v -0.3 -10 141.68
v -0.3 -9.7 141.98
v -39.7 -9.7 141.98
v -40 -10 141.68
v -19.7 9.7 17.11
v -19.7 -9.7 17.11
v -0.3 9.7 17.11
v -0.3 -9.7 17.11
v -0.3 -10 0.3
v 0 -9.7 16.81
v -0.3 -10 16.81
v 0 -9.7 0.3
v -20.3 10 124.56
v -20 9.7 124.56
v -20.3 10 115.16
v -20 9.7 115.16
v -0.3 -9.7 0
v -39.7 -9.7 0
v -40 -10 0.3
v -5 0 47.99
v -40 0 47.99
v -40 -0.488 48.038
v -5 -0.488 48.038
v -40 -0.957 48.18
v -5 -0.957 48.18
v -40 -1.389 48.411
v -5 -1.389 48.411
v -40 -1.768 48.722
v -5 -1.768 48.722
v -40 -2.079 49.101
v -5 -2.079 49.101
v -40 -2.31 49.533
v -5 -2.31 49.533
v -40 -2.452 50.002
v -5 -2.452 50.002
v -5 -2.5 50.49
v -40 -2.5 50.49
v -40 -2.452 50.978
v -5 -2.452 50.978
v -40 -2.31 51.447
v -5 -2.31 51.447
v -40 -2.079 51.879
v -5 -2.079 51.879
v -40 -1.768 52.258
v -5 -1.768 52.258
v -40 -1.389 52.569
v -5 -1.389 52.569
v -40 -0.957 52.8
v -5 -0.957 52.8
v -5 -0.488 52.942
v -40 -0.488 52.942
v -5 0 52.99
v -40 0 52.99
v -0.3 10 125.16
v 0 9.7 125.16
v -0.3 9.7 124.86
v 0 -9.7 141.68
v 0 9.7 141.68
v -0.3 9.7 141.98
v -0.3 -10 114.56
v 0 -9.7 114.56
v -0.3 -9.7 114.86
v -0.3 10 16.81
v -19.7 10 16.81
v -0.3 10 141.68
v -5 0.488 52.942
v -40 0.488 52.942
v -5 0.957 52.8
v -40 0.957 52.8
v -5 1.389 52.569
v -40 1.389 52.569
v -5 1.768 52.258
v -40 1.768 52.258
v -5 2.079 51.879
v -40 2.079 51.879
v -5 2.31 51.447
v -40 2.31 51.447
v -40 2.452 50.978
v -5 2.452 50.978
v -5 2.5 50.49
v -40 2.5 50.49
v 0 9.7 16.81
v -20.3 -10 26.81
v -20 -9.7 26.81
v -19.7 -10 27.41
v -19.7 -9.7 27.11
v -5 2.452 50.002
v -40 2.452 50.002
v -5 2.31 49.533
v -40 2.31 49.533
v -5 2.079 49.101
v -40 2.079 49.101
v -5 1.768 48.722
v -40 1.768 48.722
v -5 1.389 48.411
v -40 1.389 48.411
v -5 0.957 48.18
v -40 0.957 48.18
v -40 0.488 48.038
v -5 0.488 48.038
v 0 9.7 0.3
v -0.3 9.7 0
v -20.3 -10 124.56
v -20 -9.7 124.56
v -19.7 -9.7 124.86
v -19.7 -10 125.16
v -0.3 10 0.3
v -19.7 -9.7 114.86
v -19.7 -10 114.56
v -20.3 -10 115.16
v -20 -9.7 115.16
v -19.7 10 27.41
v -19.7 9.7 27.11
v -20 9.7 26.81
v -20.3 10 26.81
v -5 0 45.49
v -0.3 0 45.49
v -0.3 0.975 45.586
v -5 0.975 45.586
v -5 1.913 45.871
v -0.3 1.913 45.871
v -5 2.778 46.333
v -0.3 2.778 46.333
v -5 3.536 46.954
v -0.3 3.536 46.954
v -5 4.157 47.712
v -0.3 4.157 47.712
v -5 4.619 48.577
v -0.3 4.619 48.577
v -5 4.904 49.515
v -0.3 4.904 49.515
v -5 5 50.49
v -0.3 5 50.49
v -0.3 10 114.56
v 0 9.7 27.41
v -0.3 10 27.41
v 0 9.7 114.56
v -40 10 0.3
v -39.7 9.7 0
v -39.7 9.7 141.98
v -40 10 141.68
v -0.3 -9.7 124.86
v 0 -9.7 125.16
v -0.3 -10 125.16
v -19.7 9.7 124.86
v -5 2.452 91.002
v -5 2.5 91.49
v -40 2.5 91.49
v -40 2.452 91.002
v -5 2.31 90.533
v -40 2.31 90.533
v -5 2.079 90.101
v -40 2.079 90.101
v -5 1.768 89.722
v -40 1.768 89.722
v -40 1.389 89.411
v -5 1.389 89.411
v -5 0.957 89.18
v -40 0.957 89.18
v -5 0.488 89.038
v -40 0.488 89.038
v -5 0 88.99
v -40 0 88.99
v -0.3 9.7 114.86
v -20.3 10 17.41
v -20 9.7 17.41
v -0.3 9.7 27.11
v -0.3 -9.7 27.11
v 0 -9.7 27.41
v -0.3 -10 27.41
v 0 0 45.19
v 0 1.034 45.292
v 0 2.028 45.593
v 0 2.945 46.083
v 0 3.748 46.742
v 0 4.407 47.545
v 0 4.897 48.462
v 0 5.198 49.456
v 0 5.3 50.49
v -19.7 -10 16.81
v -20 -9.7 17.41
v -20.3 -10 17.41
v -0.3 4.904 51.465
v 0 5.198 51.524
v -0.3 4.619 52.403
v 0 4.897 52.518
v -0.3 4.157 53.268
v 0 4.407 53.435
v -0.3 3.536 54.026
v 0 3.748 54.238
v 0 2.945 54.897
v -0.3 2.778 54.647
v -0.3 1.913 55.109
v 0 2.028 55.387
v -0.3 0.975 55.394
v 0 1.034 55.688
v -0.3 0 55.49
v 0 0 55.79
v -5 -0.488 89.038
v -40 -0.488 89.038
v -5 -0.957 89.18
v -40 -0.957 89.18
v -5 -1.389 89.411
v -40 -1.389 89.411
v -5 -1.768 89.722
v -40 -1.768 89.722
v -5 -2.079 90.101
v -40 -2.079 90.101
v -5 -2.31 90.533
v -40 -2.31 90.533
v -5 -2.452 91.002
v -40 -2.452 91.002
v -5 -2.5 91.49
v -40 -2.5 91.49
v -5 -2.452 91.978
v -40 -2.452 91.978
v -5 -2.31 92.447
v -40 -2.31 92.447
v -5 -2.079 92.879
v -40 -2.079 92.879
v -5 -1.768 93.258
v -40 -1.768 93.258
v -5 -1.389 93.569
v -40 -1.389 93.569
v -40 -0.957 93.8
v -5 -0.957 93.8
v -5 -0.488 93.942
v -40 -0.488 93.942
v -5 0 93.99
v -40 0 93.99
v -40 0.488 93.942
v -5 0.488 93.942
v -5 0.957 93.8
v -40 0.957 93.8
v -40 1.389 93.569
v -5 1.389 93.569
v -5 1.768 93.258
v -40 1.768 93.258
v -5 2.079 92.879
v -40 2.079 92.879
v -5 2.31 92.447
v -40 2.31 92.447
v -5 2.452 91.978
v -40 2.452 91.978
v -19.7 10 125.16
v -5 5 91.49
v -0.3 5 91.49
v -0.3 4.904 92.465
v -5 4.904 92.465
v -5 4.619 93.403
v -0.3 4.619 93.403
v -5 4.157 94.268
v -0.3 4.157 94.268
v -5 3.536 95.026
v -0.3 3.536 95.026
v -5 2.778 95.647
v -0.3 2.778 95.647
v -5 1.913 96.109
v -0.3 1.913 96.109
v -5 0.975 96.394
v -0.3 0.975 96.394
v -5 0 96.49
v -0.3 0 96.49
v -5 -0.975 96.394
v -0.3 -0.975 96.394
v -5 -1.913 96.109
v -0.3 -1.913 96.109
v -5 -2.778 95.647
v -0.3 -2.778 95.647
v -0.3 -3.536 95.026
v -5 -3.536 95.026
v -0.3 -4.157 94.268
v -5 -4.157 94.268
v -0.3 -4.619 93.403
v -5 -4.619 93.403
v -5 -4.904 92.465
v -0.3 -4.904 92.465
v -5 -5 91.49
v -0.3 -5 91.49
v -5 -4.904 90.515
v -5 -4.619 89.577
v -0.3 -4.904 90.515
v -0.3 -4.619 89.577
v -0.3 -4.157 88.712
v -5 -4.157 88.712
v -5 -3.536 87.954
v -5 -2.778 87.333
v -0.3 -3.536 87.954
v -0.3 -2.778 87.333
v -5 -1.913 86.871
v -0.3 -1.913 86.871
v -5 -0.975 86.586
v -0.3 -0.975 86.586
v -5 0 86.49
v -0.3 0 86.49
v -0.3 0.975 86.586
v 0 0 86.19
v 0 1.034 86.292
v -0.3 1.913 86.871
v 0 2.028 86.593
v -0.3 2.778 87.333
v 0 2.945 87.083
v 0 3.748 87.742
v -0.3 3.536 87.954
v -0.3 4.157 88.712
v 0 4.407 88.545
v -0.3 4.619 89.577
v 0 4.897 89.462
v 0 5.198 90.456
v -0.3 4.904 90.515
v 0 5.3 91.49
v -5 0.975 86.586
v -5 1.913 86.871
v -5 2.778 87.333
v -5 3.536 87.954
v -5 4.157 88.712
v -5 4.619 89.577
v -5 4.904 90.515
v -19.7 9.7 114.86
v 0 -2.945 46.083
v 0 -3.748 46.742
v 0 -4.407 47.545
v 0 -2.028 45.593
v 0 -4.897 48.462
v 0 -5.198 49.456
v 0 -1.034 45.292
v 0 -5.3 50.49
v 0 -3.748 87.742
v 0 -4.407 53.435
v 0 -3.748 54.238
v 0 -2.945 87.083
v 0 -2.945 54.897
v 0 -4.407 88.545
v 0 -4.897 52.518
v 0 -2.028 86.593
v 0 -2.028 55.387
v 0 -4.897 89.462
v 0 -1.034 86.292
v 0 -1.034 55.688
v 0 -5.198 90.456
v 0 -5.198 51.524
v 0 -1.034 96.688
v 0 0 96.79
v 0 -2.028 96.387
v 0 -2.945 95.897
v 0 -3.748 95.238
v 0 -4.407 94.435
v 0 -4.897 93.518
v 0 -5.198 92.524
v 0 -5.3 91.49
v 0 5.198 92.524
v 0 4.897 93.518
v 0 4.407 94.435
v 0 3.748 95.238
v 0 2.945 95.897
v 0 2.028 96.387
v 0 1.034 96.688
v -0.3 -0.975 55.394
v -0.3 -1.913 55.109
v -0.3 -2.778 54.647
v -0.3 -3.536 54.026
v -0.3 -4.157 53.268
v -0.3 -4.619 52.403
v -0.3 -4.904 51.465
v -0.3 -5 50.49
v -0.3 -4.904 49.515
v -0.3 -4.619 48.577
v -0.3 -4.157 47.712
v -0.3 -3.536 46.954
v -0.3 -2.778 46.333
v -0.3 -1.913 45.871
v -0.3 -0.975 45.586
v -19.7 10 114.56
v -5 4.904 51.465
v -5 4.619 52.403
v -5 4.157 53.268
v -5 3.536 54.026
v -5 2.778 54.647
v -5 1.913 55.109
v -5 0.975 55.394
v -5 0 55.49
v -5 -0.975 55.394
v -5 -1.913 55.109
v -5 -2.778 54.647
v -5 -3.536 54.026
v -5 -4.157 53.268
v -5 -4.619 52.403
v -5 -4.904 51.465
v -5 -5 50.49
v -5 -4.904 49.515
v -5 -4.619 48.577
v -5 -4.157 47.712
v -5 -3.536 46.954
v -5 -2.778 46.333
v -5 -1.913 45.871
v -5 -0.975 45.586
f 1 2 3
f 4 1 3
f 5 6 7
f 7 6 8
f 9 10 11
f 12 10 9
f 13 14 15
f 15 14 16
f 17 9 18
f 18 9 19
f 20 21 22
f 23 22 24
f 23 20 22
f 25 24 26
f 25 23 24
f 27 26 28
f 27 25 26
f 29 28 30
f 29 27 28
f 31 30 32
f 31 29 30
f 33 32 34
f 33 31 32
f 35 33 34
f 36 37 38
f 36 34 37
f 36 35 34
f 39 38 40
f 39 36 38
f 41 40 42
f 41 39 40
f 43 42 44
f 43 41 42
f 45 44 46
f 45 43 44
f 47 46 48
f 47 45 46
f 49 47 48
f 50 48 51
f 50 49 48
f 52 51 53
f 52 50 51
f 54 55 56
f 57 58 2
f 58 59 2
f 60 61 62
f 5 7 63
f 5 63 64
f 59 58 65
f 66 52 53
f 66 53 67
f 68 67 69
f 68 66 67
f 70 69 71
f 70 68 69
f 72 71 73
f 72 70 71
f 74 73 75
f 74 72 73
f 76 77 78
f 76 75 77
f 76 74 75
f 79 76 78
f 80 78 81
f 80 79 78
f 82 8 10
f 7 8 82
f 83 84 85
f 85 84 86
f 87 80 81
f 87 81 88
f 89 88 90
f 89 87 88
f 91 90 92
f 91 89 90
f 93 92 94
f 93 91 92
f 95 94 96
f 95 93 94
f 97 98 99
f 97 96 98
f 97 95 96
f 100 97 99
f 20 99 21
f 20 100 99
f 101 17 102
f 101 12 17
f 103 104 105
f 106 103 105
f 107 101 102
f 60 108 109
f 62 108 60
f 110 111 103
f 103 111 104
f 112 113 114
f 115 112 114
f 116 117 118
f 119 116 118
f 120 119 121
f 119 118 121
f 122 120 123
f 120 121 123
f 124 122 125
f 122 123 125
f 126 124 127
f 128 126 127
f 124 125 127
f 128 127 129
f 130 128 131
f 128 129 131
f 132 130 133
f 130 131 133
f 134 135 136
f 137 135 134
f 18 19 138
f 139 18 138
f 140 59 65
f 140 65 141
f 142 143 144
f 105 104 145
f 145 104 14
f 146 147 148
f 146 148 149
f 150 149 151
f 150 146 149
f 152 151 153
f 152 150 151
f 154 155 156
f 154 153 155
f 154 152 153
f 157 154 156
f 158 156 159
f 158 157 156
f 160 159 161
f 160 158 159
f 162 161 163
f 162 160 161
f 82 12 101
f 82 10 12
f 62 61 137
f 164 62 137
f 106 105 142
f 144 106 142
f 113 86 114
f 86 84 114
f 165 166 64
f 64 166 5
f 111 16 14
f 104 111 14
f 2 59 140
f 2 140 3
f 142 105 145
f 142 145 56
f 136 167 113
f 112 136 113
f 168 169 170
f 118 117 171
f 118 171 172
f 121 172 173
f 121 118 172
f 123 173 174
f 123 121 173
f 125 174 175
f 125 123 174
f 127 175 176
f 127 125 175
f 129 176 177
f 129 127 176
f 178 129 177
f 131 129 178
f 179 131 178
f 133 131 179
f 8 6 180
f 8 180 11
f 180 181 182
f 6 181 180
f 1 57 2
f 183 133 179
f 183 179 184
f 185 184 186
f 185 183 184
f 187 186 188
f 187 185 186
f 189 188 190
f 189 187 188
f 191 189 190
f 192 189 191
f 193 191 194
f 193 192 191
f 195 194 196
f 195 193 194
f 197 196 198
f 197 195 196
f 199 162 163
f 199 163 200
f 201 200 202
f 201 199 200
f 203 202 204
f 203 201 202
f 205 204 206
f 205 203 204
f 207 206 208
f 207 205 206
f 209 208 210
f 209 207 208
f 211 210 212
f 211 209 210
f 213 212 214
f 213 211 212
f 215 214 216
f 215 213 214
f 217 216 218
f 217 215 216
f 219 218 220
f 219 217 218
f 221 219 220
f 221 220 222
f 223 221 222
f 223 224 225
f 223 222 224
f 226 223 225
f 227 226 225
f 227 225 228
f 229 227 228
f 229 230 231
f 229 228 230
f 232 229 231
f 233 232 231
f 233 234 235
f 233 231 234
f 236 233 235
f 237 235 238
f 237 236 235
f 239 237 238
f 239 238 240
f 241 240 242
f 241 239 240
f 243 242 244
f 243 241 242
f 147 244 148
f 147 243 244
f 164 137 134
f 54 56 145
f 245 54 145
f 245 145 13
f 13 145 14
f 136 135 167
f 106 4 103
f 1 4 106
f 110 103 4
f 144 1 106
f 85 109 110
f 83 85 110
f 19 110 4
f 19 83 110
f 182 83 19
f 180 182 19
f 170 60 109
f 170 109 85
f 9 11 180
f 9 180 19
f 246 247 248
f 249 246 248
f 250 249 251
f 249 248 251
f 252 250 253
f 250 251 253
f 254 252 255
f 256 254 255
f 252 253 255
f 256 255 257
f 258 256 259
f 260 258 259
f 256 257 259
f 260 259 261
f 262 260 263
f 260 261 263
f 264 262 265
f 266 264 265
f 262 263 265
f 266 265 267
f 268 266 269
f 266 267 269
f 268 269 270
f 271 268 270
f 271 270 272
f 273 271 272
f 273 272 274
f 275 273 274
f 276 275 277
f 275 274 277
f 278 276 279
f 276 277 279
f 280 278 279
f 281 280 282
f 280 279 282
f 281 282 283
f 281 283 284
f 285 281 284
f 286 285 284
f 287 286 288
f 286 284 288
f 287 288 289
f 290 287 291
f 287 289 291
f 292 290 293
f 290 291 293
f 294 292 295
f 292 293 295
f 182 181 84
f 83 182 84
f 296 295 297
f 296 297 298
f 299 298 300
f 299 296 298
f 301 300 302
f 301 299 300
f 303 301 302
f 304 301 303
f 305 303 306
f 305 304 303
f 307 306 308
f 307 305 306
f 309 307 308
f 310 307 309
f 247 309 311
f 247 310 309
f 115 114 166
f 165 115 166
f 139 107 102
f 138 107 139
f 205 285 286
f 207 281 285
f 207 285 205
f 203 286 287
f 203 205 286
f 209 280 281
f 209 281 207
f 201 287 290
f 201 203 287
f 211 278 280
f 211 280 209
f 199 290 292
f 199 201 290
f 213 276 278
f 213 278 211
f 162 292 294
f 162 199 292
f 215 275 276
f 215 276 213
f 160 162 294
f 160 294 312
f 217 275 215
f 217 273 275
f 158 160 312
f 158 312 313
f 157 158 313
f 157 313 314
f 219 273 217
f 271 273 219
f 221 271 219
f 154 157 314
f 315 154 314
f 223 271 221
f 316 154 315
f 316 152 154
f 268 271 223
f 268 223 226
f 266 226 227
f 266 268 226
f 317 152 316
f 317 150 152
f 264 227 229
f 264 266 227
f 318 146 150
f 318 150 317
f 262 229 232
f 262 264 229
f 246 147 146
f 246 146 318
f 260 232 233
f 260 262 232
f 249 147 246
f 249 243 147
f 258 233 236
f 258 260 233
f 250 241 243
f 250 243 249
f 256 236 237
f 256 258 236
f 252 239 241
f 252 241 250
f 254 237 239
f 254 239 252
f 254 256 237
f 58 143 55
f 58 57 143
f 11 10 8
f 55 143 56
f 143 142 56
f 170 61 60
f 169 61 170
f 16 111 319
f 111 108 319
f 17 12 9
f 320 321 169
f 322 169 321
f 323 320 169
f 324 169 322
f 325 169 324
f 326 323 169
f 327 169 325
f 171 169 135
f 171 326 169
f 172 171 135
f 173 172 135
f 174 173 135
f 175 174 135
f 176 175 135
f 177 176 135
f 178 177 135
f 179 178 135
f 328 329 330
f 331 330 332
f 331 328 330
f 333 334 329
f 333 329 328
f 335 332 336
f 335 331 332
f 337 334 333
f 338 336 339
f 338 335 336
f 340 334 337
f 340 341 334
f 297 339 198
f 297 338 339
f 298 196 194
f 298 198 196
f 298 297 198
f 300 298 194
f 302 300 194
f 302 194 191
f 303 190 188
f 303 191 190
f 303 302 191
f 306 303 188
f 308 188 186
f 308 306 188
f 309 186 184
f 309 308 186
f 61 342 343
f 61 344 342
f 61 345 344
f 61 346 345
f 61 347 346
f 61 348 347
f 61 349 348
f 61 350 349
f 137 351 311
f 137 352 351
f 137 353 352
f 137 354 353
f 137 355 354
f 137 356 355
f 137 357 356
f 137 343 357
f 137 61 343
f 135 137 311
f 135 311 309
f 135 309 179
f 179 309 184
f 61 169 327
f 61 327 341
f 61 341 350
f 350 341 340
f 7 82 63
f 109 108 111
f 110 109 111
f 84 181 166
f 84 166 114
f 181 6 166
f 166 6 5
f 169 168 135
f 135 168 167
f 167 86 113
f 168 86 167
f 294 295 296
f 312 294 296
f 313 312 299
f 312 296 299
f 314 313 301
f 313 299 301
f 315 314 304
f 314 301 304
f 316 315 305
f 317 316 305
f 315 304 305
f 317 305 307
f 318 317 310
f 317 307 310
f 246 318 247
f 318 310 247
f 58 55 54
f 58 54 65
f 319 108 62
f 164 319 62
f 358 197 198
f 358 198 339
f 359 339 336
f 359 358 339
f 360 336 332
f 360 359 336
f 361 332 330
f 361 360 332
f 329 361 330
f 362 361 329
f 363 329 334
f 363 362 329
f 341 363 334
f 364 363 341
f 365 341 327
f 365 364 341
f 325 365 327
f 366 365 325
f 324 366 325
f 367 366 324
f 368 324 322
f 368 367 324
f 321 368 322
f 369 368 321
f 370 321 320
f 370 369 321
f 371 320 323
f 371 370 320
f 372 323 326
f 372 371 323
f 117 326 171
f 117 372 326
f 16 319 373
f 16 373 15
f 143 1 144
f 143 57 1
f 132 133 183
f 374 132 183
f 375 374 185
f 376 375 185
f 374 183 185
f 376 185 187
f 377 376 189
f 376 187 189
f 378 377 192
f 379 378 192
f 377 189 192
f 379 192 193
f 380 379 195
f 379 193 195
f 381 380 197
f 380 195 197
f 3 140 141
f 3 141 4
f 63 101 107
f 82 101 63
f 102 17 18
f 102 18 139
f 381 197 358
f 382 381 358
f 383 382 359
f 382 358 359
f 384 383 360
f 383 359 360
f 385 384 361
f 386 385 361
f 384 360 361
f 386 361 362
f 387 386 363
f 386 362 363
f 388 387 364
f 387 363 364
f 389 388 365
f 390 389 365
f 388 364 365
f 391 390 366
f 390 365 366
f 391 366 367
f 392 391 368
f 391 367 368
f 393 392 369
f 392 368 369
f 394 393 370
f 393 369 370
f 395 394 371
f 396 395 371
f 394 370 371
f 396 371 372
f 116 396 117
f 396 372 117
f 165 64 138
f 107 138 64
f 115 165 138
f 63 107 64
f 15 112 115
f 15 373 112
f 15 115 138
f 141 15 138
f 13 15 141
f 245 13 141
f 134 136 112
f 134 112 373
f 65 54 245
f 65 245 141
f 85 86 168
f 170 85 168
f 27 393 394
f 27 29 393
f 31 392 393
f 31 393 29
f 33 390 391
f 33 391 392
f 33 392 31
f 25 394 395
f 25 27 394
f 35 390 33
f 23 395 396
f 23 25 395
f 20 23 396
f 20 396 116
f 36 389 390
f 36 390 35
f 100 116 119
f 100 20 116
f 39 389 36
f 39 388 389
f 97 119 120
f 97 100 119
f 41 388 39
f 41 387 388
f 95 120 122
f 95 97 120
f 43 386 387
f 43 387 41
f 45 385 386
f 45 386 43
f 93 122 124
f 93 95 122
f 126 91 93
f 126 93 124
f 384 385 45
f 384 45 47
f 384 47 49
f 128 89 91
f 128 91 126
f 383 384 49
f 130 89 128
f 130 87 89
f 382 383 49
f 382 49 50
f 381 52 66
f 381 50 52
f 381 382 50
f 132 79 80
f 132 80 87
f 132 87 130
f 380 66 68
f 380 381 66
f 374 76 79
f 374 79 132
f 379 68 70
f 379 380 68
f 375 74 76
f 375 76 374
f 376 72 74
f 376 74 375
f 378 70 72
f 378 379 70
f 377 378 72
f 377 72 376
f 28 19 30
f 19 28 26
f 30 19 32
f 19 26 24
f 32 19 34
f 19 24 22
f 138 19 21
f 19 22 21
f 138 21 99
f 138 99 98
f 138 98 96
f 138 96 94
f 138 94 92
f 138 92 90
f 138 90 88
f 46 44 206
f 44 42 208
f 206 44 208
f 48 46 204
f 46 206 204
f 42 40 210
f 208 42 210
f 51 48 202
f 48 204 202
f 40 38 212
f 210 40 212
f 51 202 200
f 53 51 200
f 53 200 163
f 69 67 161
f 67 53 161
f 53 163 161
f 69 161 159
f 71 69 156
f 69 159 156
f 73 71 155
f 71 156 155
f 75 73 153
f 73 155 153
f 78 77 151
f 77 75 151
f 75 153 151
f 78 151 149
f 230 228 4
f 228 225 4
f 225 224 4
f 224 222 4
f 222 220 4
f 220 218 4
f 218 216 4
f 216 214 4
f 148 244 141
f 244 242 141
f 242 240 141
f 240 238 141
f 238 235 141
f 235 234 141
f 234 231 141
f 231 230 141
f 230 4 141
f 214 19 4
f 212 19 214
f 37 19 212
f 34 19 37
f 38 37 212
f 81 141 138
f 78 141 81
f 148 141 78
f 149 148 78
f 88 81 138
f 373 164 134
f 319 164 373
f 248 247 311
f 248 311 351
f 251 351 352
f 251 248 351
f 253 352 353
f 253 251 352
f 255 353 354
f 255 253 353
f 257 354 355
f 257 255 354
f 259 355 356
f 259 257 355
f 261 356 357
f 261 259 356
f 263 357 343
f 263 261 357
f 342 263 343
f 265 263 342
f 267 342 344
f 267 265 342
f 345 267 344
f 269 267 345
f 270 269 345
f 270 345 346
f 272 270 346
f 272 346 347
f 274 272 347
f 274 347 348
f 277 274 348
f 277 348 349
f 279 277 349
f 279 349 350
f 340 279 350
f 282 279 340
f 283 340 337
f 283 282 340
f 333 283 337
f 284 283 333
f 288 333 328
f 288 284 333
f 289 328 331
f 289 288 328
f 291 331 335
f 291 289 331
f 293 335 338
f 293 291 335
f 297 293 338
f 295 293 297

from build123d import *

# Parameters (mm, degrees)
F1_DEPTH = 40
F3_DEPTH = 5
F4_DEPTH = 40.001
F6_W     = 20
F6_H     = 10
F7_DEPTH = 25
F8_SIZE  = 0.3


with BuildPart() as f1:
    # F0 (on Right) → F1 (new body)
    with BuildSketch(Plane.YZ):
        Polygon((-10, 0), (0, 0), (10, 0), (10, 141.98), (-10, 141.98), align=None)
    extrude(amount=-F1_DEPTH)

    # F2 (on Right) → F3 (cut)
    with BuildSketch(Plane.YZ):
        with BuildLine():
            ThreePointArc((5, 91.49), (-3.5355339059, 95.0255339059), (0, 86.49))
            ThreePointArc((0, 86.49), (3.5355339059, 87.9544660941), (5, 91.49))
        make_face()
        with BuildLine():
            ThreePointArc((2.5, 91.49), (1.767766953, 89.722233047), (0, 88.99))
            ThreePointArc((0, 88.99), (-1.767766953, 93.257766953), (2.5, 91.49))
        make_face(mode=Mode.SUBTRACT)
        with BuildLine():
            Line((0, 47.99), (0, 45.49))
            ThreePointArc((0, 45.49), (3.5355339059, 46.9544660941), (5, 50.49))
            ThreePointArc((5, 50.49), (3.5355339059, 54.0255339059), (0, 55.49))
            Line((0, 55.49), (0, 52.99))
            ThreePointArc((0, 52.99), (1.767766953, 52.257766953), (2.5, 50.49))
            ThreePointArc((2.5, 50.49), (1.767766953, 48.722233047), (0, 47.99))
        make_face()
        with BuildLine():
            ThreePointArc((0, 55.49), (-5, 50.49), (0, 45.49))
            Line((0, 45.49), (0, 47.99))
            ThreePointArc((0, 47.99), (-2.5, 50.49), (0, 52.99))
            Line((0, 52.99), (0, 55.49))
        make_face()
    extrude(amount=-F3_DEPTH, mode=Mode.SUBTRACT)

    # F4 (cut, through all): faces of the model
    f4_faces = [f1.faces().sort_by_distance(p)[0] for p in [
        (0, 0, 91.49),
        (0, 0, 50.49),
    ]]
    extrude(f4_faces, amount=-F4_DEPTH, mode=Mode.SUBTRACT)

    # F6 (on offset) → F7 (cut)
    with BuildSketch(Plane.XZ.offset(10)):
        with Locations((-10, 119.86)):
            Rectangle(F6_W, F6_H)
        with Locations((-10, 22.11)):
            Rectangle(F6_W, F6_H)
    extrude(amount=-F7_DEPTH, mode=Mode.SUBTRACT)

    # F8
    f8_edges = [f1.edges().sort_by_distance(p)[0] for p in [
        (0, 0, 0),
        (0, -10, 8.555),
        (0, 0, 17.11),
        (0, 10, 8.555),
        (0, 0, 27.11),
        (0, -10, 70.985),
        (0, 0, 114.86),
        (0, 10, 70.985),
        (0, 0, 45.49),
        (0, -5, 91.49),
        (0, 0, 124.86),
        (0, -10, 133.42),
        (0, 0, 141.98),
        (0, 10, 133.42),
        (-20, -10, 0),
        (-40, 0, 0),
        (-20, 10, 0),
        (-20, 10, 141.98),
        (-20, -10, 141.98),
        (-40, 0, 141.98),
        (-10, -10, 124.86),
        (-20, 0, 124.86),
        (-10, 10, 124.86),
        (-20, 0, 114.86),
        (-10, -10, 114.86),
        (-10, 10, 114.86),
        (-10, -10, 27.11),
        (-20, 0, 27.11),
        (-10, 10, 27.11),
        (-10, -10, 17.11),
        (-10, 10, 17.11),
        (-20, 0, 17.11),
        (-20, -10, 119.86),
        (-20, -10, 22.11),
        (-20, 10, 22.11),
        (-20, 10, 119.86),
    ]]
    chamfer(f8_edges, length=F8_SIZE)


solid = f1.part
